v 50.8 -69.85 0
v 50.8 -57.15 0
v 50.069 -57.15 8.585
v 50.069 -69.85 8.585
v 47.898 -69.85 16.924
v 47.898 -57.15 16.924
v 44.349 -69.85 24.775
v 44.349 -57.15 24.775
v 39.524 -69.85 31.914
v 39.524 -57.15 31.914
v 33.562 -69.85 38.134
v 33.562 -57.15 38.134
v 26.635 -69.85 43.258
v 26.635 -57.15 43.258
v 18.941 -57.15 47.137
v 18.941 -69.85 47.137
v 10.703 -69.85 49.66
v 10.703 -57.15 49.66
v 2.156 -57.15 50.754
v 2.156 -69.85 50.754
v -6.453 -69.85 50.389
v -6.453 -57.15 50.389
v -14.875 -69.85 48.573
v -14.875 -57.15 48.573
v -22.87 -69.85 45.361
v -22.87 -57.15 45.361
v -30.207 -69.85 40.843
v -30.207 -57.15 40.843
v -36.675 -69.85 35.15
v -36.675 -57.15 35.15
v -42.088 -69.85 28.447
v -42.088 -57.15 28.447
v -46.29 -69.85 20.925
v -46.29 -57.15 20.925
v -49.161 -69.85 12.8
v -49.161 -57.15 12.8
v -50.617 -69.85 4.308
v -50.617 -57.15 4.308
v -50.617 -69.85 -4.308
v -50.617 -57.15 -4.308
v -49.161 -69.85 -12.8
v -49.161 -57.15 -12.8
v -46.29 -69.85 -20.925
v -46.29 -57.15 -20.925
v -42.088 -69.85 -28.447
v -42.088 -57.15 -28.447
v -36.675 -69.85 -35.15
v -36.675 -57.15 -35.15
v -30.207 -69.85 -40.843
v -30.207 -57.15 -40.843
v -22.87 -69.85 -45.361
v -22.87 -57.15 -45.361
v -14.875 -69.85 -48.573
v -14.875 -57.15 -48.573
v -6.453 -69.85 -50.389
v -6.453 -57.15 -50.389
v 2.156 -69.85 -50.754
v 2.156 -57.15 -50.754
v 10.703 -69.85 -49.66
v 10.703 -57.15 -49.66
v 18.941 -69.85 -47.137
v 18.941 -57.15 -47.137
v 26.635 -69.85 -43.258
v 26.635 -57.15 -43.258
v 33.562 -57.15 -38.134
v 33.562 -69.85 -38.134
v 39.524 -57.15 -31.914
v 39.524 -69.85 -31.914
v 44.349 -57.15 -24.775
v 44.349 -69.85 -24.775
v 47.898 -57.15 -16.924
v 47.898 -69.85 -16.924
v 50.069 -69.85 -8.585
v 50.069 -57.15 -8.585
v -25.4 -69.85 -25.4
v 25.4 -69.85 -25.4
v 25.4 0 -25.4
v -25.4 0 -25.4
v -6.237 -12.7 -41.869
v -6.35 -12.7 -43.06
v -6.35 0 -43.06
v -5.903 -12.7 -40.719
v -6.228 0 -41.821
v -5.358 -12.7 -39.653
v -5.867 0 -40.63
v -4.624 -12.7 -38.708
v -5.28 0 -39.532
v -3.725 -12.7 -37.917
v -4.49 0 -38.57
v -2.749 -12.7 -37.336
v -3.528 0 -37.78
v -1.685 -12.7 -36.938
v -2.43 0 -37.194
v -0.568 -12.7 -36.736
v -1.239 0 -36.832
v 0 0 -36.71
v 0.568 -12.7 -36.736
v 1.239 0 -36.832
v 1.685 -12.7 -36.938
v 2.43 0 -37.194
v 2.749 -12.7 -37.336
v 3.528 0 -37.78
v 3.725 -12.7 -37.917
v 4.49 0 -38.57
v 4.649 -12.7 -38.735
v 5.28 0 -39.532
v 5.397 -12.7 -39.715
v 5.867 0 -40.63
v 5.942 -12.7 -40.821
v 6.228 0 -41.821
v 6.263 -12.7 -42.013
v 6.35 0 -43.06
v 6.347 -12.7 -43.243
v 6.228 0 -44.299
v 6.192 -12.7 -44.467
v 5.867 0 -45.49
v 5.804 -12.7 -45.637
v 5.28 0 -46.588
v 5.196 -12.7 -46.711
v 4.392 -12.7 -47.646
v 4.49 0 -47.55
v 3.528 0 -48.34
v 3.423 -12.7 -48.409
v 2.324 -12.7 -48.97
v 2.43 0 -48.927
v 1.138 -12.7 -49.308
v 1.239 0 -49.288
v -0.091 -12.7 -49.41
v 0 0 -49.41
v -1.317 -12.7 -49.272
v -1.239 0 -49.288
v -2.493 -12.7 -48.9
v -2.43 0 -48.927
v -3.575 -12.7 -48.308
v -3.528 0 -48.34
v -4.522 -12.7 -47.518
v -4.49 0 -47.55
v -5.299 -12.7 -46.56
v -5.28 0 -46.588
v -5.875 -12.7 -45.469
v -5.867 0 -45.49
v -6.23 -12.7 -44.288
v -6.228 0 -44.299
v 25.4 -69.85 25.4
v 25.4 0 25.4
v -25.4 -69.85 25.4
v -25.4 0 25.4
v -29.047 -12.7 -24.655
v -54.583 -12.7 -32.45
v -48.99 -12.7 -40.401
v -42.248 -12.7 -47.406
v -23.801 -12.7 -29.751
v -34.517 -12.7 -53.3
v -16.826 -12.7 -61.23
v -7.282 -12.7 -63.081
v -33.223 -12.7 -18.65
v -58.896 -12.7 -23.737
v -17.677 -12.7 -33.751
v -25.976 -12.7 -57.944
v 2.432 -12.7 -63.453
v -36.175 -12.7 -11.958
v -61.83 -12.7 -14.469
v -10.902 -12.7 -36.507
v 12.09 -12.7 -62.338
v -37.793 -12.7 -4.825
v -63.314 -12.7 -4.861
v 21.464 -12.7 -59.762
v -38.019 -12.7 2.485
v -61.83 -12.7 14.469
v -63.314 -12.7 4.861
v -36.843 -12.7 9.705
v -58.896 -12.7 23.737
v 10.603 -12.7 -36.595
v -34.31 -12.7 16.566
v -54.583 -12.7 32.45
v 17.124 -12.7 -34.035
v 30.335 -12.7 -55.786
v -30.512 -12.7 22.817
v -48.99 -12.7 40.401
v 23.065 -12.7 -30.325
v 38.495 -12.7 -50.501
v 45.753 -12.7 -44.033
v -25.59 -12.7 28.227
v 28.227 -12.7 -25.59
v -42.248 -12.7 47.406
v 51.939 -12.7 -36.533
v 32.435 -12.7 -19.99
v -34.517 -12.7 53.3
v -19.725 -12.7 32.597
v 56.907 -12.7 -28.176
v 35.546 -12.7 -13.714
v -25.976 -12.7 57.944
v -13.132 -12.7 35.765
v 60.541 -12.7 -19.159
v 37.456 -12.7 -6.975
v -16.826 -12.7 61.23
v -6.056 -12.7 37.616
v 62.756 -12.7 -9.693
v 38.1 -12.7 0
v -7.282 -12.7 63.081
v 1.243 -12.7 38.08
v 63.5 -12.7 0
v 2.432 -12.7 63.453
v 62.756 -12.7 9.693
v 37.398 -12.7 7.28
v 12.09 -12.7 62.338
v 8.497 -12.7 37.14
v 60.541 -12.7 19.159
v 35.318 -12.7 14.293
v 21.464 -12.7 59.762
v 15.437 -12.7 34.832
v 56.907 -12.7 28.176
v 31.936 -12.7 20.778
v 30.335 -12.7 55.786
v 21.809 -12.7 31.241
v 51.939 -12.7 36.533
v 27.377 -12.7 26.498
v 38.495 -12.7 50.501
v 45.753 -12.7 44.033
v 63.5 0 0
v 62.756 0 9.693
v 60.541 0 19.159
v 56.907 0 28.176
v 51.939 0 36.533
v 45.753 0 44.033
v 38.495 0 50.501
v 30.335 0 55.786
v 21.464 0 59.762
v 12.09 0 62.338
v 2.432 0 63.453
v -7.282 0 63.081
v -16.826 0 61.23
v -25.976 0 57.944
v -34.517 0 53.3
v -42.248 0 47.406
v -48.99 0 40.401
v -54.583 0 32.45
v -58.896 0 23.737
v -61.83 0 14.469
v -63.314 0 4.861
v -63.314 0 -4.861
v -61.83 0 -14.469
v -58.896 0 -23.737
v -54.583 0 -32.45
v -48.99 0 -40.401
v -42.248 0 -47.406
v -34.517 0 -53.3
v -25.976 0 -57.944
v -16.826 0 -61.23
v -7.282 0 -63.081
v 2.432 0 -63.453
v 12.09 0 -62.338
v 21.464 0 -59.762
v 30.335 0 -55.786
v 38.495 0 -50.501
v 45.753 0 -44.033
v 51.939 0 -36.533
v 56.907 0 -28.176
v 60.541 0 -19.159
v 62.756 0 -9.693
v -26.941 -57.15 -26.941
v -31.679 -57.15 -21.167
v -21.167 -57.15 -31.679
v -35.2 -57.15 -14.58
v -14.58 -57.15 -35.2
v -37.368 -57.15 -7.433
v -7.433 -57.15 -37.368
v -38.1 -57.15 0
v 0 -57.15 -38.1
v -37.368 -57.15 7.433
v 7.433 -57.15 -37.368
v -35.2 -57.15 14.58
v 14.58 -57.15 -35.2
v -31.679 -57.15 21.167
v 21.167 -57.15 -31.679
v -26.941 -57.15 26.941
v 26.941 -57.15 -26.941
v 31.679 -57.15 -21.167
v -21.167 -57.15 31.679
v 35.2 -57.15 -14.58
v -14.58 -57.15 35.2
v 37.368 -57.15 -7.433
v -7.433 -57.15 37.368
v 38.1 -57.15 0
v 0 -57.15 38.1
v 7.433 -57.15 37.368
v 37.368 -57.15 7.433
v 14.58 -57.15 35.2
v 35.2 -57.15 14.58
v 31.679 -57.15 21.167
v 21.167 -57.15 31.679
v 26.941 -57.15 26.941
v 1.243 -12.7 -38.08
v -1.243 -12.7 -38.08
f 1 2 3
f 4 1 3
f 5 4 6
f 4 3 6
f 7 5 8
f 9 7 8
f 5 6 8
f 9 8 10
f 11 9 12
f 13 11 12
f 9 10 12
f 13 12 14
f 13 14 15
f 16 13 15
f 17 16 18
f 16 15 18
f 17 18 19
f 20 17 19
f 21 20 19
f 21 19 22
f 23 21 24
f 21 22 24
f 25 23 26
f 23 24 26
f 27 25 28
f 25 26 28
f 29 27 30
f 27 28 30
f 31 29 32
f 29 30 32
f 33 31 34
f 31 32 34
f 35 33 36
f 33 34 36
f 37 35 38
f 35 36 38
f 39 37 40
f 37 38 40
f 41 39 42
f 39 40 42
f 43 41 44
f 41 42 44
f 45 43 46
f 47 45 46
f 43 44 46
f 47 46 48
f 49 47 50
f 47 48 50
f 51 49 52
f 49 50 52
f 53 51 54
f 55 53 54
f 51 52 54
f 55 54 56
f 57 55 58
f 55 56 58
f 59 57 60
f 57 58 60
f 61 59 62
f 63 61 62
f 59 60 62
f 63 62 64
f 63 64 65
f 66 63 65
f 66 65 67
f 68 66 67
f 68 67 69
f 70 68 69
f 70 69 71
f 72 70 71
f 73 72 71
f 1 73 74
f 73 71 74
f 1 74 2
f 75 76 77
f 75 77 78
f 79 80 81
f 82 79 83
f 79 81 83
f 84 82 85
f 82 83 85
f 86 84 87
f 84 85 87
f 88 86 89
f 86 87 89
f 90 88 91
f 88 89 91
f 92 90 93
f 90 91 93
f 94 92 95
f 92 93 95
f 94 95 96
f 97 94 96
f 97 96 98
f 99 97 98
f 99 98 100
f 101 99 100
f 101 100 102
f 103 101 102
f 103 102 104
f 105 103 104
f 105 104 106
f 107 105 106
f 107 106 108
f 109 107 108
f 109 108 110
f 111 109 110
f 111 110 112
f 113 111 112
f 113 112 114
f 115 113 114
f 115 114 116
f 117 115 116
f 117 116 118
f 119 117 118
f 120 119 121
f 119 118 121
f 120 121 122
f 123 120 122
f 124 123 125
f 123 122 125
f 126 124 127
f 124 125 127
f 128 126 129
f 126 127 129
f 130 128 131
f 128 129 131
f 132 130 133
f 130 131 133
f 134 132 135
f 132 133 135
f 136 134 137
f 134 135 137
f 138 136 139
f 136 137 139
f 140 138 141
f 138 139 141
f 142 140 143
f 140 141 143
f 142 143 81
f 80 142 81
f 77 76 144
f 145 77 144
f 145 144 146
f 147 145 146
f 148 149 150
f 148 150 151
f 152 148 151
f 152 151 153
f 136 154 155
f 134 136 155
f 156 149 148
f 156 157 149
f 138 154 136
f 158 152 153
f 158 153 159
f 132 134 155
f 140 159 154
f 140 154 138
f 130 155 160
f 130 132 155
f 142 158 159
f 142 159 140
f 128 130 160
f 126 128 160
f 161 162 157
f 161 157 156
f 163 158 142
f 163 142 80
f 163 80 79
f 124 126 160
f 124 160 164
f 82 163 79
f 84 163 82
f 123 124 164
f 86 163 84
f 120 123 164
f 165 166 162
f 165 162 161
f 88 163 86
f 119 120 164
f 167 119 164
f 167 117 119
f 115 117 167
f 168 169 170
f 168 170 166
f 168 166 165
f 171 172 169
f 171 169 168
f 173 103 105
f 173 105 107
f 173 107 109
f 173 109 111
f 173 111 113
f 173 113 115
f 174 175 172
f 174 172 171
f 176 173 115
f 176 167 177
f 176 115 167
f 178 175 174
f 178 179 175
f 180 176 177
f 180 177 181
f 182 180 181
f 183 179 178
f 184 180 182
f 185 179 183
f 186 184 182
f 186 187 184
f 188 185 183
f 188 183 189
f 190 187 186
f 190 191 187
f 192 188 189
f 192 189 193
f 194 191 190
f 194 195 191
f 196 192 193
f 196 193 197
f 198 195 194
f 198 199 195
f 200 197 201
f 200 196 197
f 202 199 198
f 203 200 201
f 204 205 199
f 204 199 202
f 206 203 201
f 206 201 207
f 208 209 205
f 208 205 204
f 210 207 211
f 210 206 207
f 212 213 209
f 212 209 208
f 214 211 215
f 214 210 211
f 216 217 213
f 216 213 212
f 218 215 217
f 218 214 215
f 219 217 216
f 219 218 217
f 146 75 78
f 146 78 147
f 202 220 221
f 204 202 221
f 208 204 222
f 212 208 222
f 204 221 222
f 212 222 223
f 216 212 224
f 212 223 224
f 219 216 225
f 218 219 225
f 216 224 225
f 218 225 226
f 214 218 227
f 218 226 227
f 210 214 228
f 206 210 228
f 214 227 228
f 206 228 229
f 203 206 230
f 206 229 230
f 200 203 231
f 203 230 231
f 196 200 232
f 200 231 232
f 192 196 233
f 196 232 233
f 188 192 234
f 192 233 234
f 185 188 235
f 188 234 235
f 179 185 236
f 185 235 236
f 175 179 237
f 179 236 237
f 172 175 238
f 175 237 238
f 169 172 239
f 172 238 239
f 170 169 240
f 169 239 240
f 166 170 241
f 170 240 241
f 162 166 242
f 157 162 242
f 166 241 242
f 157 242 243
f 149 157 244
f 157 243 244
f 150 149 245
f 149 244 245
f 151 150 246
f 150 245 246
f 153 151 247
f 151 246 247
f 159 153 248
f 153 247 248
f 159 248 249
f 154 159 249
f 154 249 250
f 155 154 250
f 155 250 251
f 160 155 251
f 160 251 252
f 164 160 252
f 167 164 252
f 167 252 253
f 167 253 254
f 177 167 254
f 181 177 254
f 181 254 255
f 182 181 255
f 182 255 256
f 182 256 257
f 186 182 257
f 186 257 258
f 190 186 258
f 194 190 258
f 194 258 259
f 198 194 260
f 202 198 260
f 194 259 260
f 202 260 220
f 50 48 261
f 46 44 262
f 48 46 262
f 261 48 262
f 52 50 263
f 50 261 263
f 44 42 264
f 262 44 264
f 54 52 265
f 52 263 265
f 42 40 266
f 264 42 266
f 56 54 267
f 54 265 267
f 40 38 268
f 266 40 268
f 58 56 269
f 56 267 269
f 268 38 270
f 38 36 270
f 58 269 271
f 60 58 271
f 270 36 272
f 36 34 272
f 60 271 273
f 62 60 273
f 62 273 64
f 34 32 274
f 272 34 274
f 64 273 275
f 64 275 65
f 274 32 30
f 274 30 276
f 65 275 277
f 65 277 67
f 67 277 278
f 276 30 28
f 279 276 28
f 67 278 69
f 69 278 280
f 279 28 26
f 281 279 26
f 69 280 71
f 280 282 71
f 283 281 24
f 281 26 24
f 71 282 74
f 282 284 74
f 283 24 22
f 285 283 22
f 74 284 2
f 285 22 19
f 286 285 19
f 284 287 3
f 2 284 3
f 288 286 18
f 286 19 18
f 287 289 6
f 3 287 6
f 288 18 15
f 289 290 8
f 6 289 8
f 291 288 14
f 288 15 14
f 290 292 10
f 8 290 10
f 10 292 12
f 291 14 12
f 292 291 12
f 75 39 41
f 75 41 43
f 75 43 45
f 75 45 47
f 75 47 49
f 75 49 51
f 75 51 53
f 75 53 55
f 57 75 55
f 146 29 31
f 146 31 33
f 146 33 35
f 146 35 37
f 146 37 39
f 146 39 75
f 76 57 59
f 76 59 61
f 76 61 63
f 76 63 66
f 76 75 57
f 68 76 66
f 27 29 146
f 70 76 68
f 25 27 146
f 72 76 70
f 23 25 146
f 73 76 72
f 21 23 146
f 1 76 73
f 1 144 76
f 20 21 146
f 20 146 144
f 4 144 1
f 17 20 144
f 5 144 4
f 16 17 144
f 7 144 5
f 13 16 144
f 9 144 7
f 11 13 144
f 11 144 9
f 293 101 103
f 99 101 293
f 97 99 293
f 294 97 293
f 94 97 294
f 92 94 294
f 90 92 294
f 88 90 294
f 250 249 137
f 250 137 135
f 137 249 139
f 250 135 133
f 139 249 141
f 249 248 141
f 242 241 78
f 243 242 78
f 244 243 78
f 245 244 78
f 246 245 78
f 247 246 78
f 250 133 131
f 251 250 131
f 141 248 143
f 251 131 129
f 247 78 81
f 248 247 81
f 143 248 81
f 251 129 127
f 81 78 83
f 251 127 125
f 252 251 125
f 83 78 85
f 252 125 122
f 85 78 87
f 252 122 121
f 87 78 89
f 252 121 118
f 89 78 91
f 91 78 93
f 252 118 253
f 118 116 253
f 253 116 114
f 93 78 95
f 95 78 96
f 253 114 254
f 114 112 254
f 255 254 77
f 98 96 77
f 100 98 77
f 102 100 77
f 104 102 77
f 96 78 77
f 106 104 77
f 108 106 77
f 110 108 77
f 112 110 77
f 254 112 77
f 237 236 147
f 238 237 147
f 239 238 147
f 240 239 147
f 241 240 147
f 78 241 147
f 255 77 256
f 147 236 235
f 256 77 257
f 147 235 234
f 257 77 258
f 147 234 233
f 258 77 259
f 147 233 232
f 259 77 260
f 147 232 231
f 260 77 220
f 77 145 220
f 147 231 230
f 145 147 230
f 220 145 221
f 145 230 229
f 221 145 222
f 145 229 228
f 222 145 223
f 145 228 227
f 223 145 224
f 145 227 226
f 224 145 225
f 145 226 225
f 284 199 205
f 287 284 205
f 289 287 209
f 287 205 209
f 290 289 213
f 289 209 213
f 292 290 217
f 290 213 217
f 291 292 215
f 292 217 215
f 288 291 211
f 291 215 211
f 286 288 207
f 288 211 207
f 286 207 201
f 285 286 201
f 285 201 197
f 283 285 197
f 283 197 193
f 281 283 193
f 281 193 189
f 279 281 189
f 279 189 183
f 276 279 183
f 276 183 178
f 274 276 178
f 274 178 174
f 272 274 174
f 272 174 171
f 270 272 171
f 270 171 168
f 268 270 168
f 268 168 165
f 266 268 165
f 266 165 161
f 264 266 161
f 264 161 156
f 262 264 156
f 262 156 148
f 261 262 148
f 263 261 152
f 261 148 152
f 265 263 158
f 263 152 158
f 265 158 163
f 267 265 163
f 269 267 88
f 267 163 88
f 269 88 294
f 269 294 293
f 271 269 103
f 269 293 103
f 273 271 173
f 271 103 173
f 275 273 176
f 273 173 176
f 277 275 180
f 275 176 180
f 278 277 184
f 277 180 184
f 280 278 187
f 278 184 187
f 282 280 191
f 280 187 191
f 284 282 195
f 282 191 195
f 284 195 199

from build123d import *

# Parameters (mm, degrees)
F0_R     = 63.5
F0_W     = 50.8
F0_H     = 50.8
F1_DEPTH = 12.7
F2_R     = 38.1
F3_DEPTH = 57.15
F4_R     = 50.8
F5_DEPTH = 12.7
F6_W     = 50.8
F6_H     = 50.8
F7_DEPTH = 82.55
F8_R     = 6.35
F9_DEPTH = 12.7


with BuildPart() as f1:
    # F0 (on Front) → F1 (new body)
    with BuildSketch(Plane.XZ):
        Circle(F0_R)
        Rectangle(F0_W, F0_H, mode=Mode.SUBTRACT)
    extrude(amount=F1_DEPTH)

    # F2 (on Front) → F3 (join)
    with BuildSketch(Plane.XZ):
        Circle(F2_R)
    extrude(amount=F3_DEPTH)

    # F4 (on face) → F5 (join)
    with BuildSketch(Plane.XZ.offset(57.15)):
        Circle(F4_R)
    extrude(amount=F5_DEPTH)

    # F6 (on face) → F7 (cut)
    with BuildSketch(Plane(origin=(0, 0, 0), x_dir=(-1, 0, 0), z_dir=(0, 1, 0))):
        Rectangle(F6_W, F6_H)
    extrude(amount=-F7_DEPTH, mode=Mode.SUBTRACT)

    # F8 (on face) → F9 (cut)
    with BuildSketch(Plane(origin=(0, 0, 0), x_dir=(-1, 0, 0), z_dir=(0, 1, 0))):
        with Locations((0, -43.060273)):
            Circle(F8_R)
    extrude(amount=-F9_DEPTH, mode=Mode.SUBTRACT)


solid = f1.part
